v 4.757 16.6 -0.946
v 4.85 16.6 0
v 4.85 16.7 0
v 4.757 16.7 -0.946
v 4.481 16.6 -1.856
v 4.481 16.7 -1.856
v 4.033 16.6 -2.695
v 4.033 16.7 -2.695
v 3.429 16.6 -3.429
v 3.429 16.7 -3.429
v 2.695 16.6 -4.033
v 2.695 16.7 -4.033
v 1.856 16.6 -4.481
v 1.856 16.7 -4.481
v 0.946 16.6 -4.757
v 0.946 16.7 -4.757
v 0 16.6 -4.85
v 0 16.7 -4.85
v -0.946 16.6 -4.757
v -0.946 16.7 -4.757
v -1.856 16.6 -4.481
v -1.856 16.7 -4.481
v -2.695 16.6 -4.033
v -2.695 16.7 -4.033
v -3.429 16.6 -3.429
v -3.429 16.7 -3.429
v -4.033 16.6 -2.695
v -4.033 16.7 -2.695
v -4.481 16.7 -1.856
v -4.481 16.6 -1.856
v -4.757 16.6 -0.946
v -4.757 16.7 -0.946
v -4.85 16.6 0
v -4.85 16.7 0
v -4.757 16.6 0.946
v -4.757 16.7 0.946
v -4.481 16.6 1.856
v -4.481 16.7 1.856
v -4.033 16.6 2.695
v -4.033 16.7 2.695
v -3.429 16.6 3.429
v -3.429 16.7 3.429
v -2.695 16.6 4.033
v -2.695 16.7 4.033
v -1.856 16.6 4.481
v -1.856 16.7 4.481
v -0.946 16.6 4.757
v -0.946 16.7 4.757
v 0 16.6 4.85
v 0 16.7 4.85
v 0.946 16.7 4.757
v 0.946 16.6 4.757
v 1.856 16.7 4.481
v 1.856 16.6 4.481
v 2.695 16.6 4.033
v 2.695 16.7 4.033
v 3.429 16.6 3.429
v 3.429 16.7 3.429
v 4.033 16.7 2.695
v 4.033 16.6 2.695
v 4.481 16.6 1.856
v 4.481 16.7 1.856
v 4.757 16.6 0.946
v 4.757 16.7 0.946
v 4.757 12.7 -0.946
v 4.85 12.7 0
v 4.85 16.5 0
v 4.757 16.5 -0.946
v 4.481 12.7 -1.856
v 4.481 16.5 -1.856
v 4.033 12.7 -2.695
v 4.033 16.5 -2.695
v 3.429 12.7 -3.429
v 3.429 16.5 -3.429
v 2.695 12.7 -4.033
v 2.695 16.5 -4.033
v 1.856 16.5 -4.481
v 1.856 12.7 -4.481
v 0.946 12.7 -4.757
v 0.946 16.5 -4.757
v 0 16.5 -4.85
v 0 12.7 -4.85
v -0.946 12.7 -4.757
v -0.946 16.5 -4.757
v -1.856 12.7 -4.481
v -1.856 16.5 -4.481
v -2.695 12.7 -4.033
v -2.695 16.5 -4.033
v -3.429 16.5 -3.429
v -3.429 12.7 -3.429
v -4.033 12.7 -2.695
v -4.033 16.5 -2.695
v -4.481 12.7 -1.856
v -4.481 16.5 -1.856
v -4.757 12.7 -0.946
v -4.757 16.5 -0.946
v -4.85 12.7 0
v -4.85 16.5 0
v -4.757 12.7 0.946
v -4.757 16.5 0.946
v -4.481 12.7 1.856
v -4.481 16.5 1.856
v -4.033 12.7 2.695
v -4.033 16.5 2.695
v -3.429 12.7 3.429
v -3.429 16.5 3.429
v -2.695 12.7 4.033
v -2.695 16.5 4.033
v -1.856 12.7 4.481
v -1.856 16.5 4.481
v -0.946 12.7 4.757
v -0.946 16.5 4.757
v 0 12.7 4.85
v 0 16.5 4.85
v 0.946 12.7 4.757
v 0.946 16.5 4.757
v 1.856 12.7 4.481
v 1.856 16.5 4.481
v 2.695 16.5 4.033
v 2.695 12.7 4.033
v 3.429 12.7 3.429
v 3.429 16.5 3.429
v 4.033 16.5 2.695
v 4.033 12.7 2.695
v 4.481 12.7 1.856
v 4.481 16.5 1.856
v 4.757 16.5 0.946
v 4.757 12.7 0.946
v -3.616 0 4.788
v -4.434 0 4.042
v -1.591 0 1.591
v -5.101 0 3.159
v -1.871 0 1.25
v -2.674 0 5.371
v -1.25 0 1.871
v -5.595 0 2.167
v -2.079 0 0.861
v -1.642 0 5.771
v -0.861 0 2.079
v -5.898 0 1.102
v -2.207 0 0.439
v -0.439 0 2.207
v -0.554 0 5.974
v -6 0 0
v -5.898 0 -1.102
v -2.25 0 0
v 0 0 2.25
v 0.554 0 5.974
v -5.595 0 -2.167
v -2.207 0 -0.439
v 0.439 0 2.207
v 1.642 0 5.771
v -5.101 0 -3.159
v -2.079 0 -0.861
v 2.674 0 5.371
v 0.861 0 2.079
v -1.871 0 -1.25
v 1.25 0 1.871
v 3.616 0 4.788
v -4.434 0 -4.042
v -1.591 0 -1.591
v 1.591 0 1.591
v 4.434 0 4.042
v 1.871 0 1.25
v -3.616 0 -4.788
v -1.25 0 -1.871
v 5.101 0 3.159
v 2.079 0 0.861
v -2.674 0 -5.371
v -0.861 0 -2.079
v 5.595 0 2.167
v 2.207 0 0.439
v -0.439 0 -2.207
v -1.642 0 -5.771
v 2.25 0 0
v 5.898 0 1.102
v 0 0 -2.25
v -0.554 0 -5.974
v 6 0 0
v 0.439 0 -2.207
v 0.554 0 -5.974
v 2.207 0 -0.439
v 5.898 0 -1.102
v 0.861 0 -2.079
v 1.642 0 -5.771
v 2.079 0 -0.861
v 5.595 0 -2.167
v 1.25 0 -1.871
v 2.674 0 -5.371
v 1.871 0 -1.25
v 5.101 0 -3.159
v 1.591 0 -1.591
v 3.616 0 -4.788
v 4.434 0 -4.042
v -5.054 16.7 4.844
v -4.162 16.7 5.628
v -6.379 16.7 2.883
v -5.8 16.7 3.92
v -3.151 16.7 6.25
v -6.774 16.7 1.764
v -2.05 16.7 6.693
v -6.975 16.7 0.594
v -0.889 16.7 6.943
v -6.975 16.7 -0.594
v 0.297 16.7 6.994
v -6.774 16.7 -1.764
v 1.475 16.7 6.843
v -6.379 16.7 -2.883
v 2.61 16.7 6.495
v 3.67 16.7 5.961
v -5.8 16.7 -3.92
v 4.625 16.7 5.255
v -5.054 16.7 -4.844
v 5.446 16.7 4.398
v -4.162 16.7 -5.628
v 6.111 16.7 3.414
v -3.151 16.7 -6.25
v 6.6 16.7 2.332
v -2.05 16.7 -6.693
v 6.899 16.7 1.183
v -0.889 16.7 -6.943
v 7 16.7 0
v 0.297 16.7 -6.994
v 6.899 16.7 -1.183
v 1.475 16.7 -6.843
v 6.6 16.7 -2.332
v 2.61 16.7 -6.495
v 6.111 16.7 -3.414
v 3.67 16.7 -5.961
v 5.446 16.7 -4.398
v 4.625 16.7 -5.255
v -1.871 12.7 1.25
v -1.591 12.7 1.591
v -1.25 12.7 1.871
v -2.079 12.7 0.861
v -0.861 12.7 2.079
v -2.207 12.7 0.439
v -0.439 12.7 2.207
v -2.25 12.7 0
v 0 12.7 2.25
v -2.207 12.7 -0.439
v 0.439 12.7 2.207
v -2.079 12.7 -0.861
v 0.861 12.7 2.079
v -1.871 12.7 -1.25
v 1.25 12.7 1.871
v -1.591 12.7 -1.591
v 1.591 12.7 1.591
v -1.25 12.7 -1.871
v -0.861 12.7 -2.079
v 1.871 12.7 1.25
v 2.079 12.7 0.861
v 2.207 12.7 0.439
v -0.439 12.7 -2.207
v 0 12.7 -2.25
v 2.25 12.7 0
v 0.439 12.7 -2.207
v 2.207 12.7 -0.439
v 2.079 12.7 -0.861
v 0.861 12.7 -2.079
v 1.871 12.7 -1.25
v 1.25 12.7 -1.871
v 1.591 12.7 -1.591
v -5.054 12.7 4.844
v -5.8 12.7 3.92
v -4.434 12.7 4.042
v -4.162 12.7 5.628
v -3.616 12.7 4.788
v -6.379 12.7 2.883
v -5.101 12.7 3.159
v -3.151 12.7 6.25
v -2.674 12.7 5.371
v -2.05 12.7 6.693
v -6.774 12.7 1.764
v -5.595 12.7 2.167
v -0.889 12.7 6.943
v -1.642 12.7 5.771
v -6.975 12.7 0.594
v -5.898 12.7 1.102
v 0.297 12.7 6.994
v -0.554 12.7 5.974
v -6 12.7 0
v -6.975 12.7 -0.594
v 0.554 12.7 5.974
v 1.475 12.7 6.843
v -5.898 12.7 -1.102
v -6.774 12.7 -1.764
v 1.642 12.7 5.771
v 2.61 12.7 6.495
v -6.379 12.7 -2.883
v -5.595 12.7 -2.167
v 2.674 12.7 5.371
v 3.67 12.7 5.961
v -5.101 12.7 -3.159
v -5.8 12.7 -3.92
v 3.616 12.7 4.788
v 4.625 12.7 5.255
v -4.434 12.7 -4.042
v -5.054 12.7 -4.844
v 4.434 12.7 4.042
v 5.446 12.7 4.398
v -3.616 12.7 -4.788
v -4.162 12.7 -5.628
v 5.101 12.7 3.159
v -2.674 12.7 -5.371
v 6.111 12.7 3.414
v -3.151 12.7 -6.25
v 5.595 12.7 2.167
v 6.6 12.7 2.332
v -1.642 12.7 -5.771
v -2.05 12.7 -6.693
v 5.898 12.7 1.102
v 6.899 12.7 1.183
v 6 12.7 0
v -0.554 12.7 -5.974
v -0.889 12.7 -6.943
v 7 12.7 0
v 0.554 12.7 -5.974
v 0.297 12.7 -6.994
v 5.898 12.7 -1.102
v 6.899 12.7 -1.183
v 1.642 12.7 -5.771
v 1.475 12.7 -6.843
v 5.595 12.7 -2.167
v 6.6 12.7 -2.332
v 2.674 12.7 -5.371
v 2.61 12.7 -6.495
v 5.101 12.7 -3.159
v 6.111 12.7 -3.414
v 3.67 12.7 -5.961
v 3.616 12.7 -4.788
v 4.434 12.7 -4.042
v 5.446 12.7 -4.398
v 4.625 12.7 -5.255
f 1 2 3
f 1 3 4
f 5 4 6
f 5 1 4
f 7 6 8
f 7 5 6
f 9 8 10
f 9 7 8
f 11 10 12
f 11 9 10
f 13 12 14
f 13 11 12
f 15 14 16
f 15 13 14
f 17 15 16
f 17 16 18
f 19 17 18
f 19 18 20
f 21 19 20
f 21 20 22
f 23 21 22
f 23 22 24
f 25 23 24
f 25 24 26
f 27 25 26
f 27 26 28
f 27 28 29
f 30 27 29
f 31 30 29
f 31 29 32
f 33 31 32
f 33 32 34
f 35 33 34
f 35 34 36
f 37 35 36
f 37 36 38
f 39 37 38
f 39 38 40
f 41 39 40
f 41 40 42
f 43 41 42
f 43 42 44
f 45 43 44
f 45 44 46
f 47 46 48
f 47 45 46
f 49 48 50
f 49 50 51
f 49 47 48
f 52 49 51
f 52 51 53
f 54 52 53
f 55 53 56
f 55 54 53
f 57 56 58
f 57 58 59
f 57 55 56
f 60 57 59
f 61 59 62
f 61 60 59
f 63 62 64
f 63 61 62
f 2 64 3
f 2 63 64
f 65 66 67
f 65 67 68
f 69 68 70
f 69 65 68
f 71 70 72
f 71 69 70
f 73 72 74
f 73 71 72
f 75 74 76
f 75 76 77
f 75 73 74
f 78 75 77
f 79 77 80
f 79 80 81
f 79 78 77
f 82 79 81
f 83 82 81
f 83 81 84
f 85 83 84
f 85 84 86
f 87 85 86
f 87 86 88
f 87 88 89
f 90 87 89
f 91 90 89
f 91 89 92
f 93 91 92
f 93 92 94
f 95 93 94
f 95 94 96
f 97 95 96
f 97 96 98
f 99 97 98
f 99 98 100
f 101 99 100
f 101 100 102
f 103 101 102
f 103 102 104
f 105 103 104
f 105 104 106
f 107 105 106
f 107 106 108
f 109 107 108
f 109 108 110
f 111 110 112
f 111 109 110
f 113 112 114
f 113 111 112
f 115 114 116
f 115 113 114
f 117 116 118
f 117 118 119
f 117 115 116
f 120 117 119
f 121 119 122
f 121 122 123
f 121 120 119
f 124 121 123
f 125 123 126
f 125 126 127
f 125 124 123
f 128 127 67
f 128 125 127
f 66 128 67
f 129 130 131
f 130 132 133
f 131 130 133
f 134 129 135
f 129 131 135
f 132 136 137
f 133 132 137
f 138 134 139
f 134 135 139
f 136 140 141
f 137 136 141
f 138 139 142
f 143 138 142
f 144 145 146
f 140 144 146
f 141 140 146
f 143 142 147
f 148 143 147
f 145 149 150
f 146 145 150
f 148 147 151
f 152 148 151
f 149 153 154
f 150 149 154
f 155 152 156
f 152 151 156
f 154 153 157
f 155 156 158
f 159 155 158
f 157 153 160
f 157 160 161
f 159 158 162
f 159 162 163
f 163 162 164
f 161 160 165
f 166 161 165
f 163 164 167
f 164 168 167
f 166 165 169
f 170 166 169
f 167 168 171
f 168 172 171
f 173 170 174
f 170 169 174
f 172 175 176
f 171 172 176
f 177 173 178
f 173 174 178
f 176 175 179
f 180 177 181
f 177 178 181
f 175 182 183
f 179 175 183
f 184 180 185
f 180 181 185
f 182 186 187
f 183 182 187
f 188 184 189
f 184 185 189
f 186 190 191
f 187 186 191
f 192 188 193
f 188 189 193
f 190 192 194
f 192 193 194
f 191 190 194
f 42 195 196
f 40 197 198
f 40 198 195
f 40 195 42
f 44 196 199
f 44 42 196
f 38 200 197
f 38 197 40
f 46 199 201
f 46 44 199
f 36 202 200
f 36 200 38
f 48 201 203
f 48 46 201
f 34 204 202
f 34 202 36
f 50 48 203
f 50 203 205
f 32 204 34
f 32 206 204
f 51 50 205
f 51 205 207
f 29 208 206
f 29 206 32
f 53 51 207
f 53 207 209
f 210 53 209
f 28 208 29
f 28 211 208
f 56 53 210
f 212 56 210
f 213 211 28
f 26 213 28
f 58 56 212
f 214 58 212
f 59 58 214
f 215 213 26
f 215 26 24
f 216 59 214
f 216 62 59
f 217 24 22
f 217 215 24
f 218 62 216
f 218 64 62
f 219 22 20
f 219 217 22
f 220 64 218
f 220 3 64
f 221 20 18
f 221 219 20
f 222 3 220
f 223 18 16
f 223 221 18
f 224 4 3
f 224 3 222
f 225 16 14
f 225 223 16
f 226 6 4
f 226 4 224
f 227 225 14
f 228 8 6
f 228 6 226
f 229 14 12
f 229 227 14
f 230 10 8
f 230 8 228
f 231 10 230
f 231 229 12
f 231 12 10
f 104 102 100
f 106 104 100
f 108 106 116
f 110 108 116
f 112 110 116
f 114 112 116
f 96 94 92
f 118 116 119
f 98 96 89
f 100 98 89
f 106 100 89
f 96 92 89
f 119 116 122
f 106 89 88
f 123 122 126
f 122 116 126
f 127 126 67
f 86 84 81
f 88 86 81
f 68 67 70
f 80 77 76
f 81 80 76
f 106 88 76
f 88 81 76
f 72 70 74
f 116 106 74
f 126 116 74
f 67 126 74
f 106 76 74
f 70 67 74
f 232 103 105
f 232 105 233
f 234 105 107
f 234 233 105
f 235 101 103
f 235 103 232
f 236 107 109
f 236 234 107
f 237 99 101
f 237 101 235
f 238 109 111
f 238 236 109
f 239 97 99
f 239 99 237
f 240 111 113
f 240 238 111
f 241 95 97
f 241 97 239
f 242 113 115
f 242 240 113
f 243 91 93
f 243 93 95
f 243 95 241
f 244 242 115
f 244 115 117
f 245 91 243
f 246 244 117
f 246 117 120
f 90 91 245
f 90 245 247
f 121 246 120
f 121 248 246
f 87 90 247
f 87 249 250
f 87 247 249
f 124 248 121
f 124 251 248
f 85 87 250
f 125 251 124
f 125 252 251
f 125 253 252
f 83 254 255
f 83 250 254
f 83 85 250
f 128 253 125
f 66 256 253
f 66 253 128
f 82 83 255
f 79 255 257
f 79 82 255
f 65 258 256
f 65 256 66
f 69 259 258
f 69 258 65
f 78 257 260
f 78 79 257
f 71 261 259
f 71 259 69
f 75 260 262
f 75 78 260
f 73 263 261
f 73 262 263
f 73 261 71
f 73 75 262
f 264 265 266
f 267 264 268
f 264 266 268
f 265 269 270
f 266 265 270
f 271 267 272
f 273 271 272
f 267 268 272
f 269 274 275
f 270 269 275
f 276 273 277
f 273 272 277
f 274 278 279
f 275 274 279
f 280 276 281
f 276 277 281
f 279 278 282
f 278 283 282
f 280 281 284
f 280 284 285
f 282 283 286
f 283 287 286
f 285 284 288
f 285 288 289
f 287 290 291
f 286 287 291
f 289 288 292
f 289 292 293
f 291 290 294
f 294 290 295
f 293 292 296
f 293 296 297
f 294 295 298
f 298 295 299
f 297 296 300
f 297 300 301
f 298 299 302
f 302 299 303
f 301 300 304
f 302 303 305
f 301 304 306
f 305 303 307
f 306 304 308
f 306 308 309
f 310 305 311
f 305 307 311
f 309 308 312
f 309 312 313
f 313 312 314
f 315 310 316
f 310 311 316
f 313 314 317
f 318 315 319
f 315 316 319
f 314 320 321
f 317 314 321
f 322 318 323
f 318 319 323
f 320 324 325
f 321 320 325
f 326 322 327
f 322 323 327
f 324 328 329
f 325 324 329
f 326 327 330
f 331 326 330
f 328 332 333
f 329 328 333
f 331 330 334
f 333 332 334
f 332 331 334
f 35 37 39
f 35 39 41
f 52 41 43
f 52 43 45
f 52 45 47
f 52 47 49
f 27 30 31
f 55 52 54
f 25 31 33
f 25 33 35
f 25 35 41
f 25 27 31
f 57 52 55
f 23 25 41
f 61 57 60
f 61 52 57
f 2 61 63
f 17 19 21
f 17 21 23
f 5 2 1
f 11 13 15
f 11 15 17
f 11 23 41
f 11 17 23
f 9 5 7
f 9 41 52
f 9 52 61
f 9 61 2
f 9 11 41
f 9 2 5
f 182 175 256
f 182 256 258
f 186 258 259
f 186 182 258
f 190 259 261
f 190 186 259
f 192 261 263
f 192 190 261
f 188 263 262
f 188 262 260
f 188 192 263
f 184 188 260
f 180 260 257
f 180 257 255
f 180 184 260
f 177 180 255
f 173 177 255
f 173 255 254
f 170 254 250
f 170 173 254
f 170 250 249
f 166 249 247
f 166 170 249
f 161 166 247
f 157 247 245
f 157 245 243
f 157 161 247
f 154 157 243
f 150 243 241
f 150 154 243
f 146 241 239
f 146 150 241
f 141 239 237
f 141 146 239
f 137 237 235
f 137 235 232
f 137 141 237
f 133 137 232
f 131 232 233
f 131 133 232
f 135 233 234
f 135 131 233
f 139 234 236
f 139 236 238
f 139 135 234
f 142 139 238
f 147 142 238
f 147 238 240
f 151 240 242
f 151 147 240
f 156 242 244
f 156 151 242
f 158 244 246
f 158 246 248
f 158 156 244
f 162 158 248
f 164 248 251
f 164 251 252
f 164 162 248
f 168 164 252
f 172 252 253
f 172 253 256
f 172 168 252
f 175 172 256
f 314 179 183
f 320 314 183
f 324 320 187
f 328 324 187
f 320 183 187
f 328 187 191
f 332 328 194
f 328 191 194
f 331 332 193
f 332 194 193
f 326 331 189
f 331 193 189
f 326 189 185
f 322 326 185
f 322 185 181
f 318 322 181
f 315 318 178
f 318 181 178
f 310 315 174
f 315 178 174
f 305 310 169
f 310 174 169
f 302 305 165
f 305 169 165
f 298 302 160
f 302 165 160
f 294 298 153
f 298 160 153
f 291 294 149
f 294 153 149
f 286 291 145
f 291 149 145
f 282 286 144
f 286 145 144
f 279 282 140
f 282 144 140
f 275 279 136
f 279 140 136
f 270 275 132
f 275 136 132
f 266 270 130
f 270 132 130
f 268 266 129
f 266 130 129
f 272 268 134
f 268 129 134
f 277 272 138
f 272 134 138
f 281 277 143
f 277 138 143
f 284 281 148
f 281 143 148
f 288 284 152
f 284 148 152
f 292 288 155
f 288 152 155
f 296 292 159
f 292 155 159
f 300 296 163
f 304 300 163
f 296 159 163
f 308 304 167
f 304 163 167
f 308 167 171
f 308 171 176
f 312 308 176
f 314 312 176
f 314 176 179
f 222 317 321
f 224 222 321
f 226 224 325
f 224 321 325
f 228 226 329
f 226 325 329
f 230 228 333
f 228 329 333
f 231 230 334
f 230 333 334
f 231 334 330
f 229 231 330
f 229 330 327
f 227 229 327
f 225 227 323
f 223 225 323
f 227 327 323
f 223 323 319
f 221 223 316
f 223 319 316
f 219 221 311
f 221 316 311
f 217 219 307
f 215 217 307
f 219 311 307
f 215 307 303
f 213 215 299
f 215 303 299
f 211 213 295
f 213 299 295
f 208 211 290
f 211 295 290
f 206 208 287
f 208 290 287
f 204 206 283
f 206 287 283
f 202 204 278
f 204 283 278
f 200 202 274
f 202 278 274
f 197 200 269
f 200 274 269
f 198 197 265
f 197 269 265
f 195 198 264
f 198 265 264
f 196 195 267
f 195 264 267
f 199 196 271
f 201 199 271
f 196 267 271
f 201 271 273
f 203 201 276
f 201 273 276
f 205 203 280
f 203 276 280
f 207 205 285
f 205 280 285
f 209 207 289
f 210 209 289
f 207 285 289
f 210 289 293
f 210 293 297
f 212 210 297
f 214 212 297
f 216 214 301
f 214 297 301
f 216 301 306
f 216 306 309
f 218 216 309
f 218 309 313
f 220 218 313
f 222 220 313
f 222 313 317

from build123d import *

# Parameters (mm, degrees)
SKETCH1_R           = 6
SKETCH1_R_2         = 2.25
BOSS_EXTRUDE1_DEPTH = 12.7
SKETCH2_R           = 7
SKETCH2_R_2         = 6
SKETCH2_R_3         = 4.85
BOSS_EXTRUDE2_DEPTH = 4
BOSS_EXTRUDE3_START = 3.9
SKETCH2_2_R         = 4.85
BOSS_EXTRUDE3_DEPTH = 0.1


with BuildPart() as part:
    # Sketch1 → Boss-Extrude1 (new body)
    with BuildSketch(Plane(origin=(0, 0, 0), x_dir=(1, 0, 0), z_dir=(0, 1, 0))):
        Circle(SKETCH1_R)
        Circle(SKETCH1_R_2, mode=Mode.SUBTRACT)
    extrude(amount=BOSS_EXTRUDE1_DEPTH)

    # Sketch2 → Boss-Extrude2 (add)
    with BuildSketch(Plane(origin=(0, 12.7, 0), x_dir=(1, 0, 0), z_dir=(0, 1, 0))):
        Circle(SKETCH2_R)
        Circle(SKETCH2_R_2, mode=Mode.SUBTRACT)
        Circle(SKETCH2_R_2)
        Circle(SKETCH2_R_3, mode=Mode.SUBTRACT)
    extrude(amount=BOSS_EXTRUDE2_DEPTH)

    # Sketch2<2> → Boss-Extrude3 (add)
    with BuildSketch(Plane(origin=(0, 12.7, 0), x_dir=(1, 0, 0), z_dir=(0, 1, 0)).offset(BOSS_EXTRUDE3_START)):
        Circle(SKETCH2_2_R)
    extrude(amount=-BOSS_EXTRUDE3_DEPTH)


solid = part.part
